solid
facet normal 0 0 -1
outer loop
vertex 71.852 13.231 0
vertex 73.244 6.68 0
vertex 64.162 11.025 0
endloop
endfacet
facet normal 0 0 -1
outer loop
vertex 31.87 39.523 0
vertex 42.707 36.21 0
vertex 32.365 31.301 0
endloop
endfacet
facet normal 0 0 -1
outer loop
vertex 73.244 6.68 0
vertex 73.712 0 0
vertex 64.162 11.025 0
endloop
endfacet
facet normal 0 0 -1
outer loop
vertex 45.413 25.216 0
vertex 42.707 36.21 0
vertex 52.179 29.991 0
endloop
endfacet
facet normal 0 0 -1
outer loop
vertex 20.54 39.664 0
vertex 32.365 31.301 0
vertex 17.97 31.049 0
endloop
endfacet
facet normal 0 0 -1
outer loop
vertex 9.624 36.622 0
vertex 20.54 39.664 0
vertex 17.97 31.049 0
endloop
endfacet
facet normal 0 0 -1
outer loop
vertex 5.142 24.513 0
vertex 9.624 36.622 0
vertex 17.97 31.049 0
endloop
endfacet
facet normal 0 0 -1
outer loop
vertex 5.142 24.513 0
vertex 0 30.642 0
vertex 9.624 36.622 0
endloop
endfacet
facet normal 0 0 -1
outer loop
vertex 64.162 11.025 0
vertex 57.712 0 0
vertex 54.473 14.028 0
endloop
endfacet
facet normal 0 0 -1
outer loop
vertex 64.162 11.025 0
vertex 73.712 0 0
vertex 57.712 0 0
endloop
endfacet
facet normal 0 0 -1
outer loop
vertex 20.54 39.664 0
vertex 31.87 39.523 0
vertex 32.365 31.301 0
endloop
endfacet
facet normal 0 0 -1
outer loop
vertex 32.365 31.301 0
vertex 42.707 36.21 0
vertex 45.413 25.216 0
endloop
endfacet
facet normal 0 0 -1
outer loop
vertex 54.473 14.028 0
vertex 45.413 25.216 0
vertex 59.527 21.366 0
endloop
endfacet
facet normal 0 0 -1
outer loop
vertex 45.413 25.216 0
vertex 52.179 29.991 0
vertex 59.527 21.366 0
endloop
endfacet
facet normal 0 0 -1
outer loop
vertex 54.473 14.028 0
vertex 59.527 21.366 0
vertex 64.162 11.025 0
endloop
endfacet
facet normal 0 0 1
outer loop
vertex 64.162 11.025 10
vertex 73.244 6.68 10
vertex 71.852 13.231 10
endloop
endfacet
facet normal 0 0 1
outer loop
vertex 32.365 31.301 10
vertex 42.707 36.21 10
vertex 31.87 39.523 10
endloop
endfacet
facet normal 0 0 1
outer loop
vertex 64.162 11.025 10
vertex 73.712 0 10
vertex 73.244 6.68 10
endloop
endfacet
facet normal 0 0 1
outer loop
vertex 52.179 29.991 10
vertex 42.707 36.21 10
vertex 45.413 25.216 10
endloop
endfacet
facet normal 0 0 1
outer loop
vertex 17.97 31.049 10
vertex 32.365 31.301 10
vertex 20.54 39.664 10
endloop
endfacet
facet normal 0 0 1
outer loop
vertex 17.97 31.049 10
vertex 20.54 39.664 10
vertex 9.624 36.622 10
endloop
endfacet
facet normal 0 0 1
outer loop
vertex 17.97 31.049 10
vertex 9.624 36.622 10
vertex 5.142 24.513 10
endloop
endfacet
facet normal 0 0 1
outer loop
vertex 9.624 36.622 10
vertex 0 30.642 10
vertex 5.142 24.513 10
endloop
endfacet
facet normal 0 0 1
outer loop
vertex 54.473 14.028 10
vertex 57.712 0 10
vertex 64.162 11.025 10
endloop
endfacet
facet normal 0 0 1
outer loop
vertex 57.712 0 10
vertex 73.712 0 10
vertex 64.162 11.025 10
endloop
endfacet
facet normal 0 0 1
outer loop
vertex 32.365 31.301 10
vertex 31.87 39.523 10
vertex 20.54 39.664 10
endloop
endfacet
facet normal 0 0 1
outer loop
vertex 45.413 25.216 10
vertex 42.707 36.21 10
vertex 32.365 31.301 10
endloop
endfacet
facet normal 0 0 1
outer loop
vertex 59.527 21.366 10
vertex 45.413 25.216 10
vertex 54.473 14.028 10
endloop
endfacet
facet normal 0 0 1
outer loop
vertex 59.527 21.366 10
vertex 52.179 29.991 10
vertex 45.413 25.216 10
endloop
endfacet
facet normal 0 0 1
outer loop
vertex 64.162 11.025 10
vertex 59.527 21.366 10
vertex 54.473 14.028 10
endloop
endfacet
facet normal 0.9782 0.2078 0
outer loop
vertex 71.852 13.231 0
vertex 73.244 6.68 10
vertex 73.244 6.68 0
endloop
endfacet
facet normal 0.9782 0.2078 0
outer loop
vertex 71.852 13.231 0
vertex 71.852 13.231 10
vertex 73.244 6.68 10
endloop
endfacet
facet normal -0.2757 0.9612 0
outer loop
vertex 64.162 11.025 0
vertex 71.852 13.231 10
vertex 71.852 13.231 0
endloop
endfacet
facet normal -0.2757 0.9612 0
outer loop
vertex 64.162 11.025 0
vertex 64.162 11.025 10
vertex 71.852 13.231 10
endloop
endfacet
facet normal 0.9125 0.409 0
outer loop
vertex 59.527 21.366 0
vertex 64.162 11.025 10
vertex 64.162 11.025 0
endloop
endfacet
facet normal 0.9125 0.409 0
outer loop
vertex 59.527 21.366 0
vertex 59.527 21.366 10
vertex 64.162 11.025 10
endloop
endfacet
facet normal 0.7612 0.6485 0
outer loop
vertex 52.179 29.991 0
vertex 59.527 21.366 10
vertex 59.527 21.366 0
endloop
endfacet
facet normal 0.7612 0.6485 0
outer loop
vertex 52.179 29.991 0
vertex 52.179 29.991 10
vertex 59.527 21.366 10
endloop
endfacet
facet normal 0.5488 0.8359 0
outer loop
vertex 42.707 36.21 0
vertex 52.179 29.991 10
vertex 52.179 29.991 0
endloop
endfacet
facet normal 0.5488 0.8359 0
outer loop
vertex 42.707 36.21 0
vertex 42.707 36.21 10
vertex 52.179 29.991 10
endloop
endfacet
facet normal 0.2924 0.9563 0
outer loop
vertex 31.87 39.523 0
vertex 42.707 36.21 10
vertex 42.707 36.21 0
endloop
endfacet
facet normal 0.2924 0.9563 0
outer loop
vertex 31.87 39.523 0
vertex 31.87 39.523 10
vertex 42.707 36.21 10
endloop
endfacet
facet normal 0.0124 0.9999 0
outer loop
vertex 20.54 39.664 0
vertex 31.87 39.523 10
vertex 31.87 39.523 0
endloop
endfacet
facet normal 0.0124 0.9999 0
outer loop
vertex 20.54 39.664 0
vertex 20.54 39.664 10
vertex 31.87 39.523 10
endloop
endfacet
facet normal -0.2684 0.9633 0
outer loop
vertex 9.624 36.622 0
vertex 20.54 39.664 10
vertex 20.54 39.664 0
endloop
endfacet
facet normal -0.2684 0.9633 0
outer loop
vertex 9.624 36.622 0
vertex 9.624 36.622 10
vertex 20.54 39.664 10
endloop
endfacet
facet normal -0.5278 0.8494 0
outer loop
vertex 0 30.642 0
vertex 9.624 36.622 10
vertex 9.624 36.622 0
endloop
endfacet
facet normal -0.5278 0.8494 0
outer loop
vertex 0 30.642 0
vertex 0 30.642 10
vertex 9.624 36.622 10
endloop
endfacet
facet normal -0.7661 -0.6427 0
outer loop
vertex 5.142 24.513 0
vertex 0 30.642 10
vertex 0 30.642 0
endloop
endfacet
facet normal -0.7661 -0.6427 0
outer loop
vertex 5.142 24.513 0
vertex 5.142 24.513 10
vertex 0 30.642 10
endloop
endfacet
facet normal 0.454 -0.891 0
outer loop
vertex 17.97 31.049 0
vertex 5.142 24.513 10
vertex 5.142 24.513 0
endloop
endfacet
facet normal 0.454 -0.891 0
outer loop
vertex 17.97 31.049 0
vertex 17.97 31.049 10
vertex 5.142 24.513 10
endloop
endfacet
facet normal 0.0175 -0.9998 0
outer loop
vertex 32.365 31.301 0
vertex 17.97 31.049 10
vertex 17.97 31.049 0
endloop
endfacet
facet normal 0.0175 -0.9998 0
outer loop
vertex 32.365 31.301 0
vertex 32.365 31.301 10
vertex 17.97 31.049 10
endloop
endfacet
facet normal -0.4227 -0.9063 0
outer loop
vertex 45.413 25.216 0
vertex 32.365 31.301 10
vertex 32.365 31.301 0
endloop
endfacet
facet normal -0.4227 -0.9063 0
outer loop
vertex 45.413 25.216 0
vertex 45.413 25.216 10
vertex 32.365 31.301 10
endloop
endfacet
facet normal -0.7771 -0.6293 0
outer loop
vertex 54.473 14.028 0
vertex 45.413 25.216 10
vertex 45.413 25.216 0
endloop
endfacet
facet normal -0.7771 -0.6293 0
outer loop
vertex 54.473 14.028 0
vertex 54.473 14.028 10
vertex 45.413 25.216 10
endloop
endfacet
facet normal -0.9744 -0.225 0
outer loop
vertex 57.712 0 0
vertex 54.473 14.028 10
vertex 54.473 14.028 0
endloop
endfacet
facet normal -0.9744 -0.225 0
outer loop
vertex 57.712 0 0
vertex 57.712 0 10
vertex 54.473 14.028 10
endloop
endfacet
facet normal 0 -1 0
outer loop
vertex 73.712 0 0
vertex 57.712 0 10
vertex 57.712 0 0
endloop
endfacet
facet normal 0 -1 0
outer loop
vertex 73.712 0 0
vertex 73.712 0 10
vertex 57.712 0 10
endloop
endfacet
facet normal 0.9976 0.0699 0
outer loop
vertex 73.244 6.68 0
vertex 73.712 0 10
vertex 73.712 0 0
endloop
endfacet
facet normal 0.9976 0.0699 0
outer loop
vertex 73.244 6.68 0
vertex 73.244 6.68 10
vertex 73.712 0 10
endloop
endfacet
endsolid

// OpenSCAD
$fn = 32;

// ----------------------------------------------------------------------
// Arc stop: segment, 10 mm thick
// ----------------------------------------------------------------------

// --- parameters (mm) ---
profile_height = 10;      // extrusion height
profile_points = 17;      // points of the closed outline

profile = [[73.712, 0], [73.244, 6.68], [71.852, 13.231], [64.162, 11.025], [59.527, 21.366], [52.179, 29.991], [42.707, 36.21], [31.87, 39.523], [20.54, 39.664], [9.624, 36.622], [0, 30.642], [5.142, 24.513], [17.97, 31.049], [32.365, 31.301], [45.413, 25.216], [54.473, 14.028], [57.712, 0]];  // single closed polygon, 17 points, counter clockwise

// --- the one profile operation ---
linear_extrude(height = profile_height) polygon(points = profile);
